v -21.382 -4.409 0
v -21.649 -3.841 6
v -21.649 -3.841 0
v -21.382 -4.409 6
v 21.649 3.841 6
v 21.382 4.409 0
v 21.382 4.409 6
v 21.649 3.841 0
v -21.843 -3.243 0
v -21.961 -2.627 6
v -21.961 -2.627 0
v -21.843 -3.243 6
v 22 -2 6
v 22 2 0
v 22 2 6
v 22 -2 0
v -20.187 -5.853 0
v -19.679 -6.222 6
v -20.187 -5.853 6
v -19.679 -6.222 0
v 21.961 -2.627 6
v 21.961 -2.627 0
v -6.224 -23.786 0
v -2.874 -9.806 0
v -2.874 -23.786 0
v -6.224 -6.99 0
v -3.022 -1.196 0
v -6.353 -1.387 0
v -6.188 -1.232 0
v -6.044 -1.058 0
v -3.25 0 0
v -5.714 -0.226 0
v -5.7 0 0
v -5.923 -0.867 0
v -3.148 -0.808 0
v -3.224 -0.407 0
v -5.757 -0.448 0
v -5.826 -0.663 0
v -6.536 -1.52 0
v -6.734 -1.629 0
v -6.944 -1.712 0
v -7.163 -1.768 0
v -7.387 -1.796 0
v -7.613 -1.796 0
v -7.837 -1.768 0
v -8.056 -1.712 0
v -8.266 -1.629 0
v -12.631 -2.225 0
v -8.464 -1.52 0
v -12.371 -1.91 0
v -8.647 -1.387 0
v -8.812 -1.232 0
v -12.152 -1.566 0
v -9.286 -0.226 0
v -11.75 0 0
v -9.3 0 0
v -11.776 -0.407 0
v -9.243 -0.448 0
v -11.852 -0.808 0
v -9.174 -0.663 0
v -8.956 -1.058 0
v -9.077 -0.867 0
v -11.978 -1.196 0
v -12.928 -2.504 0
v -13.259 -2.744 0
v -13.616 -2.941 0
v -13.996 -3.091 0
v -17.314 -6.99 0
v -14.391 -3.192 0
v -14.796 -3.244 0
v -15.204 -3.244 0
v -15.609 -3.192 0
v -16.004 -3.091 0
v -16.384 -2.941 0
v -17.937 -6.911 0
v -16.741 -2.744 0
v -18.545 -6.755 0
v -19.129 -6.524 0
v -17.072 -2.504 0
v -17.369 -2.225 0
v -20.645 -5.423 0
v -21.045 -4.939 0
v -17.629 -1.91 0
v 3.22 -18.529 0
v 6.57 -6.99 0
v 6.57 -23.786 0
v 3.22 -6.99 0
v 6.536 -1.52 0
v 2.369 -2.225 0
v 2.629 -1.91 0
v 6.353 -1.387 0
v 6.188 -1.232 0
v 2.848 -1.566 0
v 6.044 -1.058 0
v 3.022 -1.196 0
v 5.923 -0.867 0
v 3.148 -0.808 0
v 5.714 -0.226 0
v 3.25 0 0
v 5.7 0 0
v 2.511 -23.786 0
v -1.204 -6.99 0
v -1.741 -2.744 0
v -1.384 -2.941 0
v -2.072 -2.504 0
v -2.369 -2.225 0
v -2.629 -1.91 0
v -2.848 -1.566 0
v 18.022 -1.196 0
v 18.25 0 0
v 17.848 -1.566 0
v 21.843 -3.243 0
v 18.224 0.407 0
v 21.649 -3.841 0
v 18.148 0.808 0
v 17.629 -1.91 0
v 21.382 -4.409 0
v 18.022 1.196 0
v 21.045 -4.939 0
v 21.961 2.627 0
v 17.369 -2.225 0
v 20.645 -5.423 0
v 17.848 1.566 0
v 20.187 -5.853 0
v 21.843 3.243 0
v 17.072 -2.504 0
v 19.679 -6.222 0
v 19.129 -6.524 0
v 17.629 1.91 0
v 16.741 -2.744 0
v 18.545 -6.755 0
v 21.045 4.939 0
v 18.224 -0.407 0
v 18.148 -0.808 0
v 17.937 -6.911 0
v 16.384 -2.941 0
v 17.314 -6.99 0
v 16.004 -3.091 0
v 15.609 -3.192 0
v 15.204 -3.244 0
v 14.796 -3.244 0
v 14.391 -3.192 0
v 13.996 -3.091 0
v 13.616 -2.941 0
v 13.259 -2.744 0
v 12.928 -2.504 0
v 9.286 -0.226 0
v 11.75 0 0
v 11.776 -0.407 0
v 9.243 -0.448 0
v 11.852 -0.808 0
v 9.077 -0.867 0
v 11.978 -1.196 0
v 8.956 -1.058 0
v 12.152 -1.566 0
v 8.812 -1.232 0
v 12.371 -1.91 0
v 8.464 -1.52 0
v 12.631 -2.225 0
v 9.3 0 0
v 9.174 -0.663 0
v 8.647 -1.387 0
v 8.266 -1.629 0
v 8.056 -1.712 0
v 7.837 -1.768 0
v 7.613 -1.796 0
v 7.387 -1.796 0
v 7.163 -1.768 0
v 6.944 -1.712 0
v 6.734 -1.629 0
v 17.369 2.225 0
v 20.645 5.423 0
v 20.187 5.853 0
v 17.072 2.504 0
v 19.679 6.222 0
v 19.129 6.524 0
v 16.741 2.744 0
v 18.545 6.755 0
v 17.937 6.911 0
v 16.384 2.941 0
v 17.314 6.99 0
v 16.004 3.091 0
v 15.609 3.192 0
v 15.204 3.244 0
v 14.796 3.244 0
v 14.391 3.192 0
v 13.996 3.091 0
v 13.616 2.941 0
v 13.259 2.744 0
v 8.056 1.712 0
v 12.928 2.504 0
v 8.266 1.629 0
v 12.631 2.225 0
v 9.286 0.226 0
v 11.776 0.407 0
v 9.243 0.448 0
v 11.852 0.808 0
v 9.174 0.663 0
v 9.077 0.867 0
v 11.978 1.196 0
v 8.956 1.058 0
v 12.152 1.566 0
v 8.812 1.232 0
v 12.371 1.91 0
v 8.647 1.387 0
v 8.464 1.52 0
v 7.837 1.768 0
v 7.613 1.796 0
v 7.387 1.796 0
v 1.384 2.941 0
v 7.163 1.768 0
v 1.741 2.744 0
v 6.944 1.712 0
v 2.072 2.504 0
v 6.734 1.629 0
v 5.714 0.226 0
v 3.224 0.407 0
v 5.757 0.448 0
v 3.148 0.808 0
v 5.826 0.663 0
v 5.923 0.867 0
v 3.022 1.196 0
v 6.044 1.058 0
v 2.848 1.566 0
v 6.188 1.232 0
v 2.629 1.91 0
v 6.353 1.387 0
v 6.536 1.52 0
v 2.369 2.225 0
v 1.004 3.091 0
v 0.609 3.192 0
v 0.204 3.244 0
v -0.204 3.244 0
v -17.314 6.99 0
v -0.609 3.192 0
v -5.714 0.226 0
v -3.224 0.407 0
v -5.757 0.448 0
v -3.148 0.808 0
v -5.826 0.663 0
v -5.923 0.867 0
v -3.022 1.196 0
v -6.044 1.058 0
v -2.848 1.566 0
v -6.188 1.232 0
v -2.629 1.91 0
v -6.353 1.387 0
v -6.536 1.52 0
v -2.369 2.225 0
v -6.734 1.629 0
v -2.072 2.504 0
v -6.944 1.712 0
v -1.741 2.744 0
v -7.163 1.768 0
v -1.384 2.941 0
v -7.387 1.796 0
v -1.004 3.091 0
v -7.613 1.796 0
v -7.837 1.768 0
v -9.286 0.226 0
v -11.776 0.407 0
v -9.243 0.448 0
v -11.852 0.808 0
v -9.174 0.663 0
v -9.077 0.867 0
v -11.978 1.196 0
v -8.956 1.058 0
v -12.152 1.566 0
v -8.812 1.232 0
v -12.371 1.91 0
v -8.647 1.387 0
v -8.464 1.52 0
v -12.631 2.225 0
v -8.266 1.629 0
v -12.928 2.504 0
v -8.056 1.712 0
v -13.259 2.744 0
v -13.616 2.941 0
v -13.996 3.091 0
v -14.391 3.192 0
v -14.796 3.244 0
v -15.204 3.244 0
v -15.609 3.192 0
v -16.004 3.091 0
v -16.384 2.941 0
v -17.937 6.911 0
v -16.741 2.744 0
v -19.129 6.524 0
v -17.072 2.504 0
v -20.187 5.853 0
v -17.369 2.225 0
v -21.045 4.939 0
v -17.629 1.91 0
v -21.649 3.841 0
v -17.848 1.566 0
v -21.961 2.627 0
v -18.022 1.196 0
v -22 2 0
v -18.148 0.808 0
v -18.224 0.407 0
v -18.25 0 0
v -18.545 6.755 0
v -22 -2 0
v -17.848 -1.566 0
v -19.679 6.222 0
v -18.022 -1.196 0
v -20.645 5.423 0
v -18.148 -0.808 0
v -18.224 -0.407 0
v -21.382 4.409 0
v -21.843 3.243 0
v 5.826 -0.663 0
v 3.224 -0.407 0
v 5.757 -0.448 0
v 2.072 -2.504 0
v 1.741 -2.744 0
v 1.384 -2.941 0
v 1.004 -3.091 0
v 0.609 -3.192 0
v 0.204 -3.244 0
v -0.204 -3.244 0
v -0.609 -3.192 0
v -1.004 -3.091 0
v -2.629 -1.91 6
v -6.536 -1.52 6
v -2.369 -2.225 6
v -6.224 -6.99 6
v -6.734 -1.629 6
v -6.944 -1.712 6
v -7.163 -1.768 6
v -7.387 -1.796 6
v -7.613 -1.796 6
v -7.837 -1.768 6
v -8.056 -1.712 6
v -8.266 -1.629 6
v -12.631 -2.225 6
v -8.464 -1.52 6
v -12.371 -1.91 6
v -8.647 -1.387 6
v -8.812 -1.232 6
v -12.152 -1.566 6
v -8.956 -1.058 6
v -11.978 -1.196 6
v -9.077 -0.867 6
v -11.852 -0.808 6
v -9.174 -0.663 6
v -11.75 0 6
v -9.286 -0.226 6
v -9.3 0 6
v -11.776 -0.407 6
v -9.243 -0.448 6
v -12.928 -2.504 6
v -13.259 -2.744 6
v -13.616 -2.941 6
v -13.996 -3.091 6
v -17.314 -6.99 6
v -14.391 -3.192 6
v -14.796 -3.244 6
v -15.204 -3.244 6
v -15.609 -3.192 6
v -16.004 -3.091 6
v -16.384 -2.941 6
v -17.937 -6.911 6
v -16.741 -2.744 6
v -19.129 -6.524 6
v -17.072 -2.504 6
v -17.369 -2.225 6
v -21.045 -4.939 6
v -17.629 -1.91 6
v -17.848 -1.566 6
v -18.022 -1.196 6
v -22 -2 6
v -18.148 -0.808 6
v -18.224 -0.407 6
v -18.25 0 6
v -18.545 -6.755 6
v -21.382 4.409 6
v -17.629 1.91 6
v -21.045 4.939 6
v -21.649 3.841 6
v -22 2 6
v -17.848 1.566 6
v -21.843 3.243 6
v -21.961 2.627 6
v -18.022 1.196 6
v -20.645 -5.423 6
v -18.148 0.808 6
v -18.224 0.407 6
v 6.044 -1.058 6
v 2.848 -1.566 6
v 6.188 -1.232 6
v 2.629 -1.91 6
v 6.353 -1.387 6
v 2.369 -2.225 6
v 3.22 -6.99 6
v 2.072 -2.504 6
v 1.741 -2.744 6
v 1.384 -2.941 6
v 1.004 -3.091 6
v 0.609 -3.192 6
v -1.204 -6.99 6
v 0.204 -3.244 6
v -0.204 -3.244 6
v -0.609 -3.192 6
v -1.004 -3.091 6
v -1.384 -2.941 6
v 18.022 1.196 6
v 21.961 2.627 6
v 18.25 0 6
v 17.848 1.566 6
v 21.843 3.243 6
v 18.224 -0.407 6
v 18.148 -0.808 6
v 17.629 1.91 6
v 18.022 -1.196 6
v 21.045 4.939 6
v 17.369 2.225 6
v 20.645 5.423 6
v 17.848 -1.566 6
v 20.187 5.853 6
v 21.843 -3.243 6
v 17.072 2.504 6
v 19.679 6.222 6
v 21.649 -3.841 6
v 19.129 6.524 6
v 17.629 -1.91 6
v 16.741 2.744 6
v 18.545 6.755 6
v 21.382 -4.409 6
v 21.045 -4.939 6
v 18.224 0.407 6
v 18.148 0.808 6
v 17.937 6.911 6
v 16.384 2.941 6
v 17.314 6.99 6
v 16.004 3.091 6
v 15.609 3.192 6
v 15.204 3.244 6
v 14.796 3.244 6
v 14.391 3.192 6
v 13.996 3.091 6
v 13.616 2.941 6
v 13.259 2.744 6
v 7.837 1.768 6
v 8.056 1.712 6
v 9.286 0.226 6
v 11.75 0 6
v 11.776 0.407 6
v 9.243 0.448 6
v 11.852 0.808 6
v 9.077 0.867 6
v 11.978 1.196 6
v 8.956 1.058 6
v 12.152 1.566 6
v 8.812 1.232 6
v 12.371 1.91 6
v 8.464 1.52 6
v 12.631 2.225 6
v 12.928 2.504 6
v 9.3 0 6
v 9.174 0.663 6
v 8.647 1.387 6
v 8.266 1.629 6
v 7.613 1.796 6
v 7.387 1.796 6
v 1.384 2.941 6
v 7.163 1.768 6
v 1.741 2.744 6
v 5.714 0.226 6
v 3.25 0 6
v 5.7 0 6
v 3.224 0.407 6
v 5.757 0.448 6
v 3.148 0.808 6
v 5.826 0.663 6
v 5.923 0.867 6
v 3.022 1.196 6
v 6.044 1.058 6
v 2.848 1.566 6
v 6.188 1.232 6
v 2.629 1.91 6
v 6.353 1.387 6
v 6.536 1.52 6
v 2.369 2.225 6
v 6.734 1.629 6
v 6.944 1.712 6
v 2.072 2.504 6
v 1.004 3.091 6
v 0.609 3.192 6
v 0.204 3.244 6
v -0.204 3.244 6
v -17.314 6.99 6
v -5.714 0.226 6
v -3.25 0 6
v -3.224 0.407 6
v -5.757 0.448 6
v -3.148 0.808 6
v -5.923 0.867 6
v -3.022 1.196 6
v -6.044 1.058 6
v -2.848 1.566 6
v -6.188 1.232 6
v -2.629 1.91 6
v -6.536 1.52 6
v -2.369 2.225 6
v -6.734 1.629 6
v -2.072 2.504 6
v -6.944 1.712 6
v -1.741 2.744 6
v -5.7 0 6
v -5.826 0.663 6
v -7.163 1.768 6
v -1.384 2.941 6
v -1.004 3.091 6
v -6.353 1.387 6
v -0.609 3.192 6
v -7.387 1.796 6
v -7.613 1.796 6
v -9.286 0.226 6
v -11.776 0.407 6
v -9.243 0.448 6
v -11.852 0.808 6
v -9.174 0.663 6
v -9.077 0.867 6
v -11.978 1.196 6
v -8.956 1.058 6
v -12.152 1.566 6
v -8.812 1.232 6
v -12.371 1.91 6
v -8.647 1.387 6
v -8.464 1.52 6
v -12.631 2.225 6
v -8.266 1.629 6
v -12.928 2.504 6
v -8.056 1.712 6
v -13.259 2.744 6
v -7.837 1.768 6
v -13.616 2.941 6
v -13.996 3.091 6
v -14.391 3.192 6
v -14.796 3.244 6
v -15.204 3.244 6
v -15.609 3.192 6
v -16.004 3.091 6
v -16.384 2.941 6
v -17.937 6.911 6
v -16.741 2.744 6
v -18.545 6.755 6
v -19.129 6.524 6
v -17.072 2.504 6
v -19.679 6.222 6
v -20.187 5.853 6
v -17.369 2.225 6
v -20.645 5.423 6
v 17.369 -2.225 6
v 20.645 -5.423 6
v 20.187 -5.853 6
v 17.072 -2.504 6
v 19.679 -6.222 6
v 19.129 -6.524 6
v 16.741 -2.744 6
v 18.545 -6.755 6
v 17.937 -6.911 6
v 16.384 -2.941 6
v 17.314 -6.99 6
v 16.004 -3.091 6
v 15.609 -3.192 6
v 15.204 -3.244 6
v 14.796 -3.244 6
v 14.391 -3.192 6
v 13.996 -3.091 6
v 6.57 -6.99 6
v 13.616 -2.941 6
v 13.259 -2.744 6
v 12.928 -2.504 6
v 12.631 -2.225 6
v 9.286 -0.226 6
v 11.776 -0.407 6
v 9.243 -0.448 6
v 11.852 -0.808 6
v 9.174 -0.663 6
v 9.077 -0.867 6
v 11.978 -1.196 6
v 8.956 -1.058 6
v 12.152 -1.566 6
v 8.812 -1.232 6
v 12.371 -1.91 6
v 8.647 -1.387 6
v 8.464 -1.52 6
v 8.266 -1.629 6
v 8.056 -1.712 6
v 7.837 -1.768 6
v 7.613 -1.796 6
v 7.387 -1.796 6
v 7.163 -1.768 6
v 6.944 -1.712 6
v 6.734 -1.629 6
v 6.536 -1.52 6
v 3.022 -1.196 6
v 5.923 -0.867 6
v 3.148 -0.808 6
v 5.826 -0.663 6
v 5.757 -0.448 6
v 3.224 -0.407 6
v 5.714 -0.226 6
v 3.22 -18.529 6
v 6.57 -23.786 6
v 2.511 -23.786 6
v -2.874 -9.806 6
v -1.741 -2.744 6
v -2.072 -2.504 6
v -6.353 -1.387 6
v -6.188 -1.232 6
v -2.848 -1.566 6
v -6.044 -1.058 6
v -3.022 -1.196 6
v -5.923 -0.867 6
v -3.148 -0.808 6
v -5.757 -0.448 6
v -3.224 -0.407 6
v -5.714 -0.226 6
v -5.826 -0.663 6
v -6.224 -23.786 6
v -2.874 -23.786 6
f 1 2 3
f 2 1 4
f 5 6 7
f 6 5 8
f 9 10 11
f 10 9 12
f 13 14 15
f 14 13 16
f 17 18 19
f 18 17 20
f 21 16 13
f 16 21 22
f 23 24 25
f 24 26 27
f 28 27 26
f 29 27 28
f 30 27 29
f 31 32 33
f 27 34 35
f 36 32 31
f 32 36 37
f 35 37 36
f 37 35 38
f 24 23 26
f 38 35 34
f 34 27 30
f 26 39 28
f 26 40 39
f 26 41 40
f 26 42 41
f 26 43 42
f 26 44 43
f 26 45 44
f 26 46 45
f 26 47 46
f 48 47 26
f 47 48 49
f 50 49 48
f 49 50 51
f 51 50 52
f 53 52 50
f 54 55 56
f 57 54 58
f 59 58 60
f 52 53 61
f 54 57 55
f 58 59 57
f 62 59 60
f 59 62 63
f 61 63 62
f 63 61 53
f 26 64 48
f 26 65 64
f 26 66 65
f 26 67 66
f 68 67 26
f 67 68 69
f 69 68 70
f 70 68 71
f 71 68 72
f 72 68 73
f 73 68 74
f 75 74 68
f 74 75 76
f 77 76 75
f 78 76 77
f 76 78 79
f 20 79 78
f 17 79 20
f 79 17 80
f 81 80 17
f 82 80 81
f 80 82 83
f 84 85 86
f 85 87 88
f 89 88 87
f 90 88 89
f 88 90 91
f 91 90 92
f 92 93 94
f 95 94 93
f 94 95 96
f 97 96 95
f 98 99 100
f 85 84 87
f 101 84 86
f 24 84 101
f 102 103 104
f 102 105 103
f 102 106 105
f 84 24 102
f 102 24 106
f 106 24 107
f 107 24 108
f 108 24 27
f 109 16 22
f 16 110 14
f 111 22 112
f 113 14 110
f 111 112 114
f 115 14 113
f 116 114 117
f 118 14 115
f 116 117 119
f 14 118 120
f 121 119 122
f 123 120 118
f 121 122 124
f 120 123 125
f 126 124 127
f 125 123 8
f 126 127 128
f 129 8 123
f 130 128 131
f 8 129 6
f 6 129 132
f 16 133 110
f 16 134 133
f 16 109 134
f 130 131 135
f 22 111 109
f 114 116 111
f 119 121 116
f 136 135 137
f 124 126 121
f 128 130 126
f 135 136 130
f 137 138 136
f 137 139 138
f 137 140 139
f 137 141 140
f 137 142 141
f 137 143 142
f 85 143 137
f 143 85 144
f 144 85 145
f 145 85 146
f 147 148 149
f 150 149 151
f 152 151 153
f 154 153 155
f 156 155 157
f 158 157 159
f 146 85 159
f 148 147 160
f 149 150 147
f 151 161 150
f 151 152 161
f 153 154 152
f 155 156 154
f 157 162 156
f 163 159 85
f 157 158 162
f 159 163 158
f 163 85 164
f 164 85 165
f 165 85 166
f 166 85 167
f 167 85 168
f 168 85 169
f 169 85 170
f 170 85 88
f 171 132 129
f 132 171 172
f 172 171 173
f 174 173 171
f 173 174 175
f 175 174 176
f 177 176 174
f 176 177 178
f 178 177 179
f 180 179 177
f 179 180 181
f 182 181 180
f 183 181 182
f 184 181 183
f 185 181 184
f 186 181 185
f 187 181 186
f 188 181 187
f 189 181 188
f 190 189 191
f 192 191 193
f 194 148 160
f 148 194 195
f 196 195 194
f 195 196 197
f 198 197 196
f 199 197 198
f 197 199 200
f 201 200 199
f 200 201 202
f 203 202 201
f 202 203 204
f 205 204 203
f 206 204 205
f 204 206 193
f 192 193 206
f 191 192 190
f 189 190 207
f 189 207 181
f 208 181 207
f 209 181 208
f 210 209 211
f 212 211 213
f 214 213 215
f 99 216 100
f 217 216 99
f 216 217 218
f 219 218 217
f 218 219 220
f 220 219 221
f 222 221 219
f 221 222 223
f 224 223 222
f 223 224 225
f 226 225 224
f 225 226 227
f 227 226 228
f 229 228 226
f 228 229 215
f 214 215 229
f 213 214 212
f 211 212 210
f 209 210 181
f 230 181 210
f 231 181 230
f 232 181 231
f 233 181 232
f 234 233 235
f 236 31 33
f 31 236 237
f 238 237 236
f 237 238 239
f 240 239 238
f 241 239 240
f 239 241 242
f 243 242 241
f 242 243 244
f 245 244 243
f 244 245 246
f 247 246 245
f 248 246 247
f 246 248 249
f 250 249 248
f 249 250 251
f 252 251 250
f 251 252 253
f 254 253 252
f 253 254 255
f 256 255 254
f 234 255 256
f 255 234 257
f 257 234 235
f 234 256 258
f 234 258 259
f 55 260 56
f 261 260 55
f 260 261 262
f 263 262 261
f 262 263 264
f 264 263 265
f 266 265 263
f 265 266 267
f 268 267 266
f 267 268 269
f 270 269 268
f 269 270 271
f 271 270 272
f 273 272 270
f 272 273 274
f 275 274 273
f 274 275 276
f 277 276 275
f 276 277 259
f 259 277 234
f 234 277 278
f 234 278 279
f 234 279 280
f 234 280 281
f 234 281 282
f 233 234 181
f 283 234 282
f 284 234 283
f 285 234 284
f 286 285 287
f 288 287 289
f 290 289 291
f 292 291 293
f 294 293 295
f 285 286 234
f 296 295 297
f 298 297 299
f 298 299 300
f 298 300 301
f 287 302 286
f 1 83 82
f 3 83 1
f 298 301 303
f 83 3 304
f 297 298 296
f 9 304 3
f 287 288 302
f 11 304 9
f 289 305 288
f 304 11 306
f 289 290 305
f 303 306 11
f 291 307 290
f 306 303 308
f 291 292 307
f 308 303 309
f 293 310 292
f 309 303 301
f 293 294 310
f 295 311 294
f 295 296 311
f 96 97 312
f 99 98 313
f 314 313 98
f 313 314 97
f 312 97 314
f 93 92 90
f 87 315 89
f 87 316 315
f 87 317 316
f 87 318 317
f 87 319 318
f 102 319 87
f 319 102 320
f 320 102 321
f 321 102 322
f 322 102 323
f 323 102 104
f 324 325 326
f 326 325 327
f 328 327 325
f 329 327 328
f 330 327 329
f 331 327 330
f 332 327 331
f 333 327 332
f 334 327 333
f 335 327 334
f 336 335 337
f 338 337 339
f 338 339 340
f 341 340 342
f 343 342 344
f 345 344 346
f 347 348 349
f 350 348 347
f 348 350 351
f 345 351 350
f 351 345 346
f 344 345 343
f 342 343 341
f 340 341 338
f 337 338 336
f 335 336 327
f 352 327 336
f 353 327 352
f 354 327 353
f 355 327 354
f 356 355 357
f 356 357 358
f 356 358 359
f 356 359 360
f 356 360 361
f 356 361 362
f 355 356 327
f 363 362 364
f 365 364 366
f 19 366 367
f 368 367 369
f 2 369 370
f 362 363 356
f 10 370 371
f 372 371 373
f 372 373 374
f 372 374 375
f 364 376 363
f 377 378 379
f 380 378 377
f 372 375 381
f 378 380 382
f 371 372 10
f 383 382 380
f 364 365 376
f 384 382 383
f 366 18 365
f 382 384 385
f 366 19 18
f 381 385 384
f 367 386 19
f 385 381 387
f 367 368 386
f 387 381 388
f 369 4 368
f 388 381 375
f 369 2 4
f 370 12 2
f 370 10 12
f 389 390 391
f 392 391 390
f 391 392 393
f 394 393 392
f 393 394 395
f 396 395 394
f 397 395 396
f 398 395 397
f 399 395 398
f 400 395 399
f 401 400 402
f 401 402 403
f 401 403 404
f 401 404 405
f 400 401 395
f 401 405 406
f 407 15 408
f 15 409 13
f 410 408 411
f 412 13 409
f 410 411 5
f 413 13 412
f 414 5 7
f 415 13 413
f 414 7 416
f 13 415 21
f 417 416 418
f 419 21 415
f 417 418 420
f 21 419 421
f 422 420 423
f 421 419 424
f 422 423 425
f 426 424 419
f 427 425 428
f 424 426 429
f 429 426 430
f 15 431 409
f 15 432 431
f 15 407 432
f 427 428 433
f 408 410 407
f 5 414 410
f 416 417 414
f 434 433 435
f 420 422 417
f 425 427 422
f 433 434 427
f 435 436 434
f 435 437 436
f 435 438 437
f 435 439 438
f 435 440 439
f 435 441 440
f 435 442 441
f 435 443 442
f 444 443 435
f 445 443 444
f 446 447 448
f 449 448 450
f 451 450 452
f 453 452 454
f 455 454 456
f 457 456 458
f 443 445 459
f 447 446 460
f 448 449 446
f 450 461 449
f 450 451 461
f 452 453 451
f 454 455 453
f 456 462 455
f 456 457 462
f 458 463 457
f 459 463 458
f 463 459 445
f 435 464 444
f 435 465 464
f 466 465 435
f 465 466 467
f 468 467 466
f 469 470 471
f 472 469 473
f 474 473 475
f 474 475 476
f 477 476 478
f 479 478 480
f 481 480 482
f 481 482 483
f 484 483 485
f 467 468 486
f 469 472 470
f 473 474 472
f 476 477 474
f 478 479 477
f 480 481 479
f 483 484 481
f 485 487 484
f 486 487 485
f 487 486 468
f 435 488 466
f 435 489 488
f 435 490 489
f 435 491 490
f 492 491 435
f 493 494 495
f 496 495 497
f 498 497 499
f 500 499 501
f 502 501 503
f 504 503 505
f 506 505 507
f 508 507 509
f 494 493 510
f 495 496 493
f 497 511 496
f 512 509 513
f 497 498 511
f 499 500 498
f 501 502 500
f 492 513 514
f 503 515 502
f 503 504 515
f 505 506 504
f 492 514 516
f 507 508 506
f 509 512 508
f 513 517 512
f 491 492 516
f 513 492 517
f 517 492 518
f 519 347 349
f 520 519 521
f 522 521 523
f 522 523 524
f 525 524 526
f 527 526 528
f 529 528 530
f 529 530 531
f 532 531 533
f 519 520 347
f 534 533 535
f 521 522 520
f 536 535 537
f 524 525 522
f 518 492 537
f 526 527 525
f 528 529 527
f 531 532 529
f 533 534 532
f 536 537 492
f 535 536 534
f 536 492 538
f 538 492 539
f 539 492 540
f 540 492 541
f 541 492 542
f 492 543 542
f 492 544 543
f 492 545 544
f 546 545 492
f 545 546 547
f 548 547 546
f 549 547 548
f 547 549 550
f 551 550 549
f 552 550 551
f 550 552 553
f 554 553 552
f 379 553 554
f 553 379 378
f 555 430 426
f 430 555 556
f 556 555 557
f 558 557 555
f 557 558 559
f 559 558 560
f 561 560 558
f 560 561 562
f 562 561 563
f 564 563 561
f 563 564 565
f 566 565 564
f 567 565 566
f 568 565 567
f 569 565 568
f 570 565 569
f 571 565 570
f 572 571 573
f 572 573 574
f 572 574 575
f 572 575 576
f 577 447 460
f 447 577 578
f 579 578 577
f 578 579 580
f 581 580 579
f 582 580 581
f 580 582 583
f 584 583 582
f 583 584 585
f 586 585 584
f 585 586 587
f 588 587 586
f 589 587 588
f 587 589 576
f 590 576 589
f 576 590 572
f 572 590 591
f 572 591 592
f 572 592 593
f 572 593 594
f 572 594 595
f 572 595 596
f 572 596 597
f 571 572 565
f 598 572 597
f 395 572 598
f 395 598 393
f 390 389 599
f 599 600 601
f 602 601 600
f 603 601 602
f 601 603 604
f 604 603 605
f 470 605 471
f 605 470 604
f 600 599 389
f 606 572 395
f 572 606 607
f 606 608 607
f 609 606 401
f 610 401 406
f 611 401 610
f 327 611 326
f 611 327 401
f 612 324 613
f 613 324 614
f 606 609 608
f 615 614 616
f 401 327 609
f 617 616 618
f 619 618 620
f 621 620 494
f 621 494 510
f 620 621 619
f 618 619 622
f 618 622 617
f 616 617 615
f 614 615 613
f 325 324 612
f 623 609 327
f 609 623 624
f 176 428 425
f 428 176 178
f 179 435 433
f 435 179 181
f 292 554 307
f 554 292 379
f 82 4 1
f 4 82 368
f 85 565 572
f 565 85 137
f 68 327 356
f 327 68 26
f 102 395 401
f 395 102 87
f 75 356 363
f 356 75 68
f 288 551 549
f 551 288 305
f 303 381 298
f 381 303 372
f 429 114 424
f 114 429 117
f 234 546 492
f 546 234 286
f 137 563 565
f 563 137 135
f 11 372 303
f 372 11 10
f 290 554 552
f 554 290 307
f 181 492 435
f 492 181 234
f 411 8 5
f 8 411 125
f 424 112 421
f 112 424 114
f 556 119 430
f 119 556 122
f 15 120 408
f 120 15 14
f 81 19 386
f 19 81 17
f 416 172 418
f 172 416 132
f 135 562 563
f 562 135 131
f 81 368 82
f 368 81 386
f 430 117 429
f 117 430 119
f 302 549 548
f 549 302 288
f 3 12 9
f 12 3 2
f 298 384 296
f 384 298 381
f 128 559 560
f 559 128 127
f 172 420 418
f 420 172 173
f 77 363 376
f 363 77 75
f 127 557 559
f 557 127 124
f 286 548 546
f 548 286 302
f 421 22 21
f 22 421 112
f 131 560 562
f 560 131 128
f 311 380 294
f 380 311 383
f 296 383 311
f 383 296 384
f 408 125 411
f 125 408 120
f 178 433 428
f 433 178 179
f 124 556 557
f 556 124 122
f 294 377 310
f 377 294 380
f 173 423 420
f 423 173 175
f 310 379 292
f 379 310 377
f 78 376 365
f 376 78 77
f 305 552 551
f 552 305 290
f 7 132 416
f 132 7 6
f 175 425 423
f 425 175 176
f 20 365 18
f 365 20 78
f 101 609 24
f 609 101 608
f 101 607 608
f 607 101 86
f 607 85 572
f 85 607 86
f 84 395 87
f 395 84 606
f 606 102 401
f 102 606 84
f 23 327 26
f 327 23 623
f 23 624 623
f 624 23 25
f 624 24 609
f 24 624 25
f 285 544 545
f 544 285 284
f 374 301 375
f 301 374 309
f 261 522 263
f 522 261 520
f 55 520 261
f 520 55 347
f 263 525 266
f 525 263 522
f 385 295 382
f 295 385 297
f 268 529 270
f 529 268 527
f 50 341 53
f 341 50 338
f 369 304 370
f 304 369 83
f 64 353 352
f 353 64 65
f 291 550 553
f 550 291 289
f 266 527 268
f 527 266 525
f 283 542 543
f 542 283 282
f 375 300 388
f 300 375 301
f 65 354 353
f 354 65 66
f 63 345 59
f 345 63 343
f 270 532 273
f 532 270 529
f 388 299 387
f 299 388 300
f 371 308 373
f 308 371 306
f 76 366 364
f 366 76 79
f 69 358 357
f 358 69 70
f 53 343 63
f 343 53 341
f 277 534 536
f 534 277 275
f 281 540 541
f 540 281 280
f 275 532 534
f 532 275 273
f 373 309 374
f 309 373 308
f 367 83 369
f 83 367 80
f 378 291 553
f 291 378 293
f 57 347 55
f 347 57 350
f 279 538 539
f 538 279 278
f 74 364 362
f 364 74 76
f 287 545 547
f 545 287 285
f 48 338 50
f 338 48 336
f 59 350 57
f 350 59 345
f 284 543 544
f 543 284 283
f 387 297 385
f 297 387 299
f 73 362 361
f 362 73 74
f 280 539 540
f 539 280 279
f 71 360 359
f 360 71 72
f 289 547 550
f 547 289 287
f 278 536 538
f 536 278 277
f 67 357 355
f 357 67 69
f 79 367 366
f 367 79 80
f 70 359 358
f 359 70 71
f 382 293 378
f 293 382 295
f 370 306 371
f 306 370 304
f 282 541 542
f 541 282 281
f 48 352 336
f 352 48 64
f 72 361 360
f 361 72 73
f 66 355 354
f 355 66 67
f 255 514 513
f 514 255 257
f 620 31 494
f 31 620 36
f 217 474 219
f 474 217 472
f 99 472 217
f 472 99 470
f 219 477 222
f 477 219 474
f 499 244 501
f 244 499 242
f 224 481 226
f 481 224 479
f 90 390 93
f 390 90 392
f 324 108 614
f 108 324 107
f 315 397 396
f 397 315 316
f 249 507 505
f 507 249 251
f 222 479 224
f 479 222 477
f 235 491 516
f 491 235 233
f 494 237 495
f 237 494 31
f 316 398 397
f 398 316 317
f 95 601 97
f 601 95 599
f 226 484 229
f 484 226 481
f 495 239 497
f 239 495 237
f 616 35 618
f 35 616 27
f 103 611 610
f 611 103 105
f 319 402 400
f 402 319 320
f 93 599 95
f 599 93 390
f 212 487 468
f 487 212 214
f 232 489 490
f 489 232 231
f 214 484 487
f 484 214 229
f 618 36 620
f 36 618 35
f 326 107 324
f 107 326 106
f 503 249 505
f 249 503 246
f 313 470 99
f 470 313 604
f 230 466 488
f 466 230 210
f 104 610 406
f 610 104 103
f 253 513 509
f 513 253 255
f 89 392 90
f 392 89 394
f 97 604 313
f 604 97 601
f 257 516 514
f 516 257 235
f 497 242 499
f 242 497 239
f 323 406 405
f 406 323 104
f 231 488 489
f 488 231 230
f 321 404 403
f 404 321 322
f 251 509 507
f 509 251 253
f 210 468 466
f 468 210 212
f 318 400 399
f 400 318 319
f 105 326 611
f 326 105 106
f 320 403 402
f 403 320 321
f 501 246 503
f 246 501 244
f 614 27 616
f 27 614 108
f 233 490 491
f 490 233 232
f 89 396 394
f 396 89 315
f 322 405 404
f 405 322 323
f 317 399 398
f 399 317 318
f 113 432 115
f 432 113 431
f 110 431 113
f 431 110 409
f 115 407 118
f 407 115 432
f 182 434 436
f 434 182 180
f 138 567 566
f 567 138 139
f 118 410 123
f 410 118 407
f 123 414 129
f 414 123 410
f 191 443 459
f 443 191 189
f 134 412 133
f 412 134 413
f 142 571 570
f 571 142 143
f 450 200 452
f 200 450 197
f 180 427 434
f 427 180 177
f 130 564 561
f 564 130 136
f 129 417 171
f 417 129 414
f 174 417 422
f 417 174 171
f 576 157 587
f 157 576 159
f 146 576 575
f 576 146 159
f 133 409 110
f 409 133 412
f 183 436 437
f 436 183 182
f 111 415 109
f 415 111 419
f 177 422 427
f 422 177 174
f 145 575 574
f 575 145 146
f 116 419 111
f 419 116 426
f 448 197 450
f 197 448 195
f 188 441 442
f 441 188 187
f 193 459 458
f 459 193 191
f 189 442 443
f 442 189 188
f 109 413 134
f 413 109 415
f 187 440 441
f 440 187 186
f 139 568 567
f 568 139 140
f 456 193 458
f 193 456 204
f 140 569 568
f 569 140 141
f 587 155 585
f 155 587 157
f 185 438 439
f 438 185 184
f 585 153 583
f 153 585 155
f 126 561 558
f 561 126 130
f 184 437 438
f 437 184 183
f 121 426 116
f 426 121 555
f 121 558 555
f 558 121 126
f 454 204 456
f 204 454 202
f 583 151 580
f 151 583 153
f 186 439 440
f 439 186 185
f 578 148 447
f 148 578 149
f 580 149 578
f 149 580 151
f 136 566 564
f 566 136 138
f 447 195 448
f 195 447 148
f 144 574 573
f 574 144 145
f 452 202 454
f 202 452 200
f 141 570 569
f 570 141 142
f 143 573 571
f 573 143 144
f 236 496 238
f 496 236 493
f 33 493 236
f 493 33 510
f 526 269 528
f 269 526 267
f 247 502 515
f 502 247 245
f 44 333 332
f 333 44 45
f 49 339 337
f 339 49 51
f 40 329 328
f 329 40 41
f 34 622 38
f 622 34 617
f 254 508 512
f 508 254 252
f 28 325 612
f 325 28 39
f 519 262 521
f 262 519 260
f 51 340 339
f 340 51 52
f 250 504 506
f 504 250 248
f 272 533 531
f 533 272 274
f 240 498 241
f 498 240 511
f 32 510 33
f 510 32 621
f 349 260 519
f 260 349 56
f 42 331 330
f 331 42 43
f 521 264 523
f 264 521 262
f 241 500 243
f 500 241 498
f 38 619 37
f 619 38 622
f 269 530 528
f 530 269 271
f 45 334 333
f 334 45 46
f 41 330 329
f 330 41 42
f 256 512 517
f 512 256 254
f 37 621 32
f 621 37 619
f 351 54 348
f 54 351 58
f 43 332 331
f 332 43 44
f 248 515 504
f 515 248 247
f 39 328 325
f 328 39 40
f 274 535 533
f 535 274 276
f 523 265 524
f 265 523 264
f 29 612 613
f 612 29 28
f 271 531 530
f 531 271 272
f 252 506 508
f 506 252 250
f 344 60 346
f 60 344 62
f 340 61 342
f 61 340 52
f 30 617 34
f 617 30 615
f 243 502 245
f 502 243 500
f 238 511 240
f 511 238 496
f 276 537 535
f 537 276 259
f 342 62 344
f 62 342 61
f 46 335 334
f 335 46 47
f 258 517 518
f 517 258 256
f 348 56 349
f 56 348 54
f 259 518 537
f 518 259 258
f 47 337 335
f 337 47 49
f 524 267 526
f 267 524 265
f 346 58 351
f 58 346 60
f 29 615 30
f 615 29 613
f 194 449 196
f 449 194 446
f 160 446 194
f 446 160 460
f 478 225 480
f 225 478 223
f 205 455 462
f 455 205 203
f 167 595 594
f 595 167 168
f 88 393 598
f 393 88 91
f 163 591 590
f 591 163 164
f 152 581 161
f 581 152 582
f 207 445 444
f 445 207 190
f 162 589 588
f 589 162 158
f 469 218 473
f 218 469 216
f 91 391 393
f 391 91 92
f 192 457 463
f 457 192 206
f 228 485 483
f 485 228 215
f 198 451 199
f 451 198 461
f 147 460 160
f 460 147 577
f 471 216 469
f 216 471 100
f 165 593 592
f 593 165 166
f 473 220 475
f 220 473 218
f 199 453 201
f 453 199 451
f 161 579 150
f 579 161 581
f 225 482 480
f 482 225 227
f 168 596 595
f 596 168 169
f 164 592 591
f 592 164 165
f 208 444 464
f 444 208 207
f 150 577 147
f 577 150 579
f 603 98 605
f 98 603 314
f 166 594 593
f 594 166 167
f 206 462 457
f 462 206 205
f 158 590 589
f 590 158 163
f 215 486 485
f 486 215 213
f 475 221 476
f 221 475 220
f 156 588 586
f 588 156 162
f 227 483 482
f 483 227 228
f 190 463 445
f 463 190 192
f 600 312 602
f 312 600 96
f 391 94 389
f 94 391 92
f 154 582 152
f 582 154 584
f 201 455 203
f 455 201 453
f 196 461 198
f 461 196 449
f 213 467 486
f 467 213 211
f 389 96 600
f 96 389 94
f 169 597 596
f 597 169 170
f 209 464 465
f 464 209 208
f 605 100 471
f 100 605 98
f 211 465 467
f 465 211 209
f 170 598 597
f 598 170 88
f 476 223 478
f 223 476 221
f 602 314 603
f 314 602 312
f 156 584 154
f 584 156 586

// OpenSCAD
$fn = 50;


difference() {
	union() {
		hull() {
			translate(v = [-17.0000000000, 2.0000000000, 0]) {
				cylinder(h = 6, r = 5);
			}
			translate(v = [17.0000000000, 2.0000000000, 0]) {
				cylinder(h = 6, r = 5);
			}
			translate(v = [-17.0000000000, -2.0000000000, 0]) {
				cylinder(h = 6, r = 5);
			}
			translate(v = [17.0000000000, -2.0000000000, 0]) {
				cylinder(h = 6, r = 5);
			}
		}
		translate(v = [0, -5, 0]) {
			linear_extrude(height = 6) {
				text(font = "DejaVu Sans Mono:style=Bold", halign = "center", size = 19.0000000000, text = "N", valign = "top");
			}
		}
	}
	union() {
		translate(v = [-15.0000000000, 0.0000000000, 0]) {
			translate(v = [0, 0, -100]) {
				cylinder(h = 200, r = 3.2500000000);
			}
		}
		translate(v = [0, 0, -100]) {
			cylinder(h = 200, r = 3.2500000000);
		}
		translate(v = [15.0000000000, 0.0000000000, 0]) {
			translate(v = [0, 0, -100]) {
				cylinder(h = 200, r = 3.2500000000);
			}
		}
		translate(v = [-15.0000000000, 0.0000000000, 0]) {
			translate(v = [0, 0, -100]) {
				cylinder(h = 200, r = 1.8000000000);
			}
		}
		translate(v = [-7.5000000000, 0.0000000000, 0]) {
			translate(v = [0, 0, -100]) {
				cylinder(h = 200, r = 1.8000000000);
			}
		}
		translate(v = [0, 0, -100]) {
			cylinder(h = 200, r = 1.8000000000);
		}
		translate(v = [7.5000000000, 0.0000000000, 0]) {
			translate(v = [0, 0, -100]) {
				cylinder(h = 200, r = 1.8000000000);
			}
		}
		translate(v = [15.0000000000, 0.0000000000, 0]) {
			translate(v = [0, 0, -100]) {
				cylinder(h = 200, r = 1.8000000000);
			}
		}
	}
}
